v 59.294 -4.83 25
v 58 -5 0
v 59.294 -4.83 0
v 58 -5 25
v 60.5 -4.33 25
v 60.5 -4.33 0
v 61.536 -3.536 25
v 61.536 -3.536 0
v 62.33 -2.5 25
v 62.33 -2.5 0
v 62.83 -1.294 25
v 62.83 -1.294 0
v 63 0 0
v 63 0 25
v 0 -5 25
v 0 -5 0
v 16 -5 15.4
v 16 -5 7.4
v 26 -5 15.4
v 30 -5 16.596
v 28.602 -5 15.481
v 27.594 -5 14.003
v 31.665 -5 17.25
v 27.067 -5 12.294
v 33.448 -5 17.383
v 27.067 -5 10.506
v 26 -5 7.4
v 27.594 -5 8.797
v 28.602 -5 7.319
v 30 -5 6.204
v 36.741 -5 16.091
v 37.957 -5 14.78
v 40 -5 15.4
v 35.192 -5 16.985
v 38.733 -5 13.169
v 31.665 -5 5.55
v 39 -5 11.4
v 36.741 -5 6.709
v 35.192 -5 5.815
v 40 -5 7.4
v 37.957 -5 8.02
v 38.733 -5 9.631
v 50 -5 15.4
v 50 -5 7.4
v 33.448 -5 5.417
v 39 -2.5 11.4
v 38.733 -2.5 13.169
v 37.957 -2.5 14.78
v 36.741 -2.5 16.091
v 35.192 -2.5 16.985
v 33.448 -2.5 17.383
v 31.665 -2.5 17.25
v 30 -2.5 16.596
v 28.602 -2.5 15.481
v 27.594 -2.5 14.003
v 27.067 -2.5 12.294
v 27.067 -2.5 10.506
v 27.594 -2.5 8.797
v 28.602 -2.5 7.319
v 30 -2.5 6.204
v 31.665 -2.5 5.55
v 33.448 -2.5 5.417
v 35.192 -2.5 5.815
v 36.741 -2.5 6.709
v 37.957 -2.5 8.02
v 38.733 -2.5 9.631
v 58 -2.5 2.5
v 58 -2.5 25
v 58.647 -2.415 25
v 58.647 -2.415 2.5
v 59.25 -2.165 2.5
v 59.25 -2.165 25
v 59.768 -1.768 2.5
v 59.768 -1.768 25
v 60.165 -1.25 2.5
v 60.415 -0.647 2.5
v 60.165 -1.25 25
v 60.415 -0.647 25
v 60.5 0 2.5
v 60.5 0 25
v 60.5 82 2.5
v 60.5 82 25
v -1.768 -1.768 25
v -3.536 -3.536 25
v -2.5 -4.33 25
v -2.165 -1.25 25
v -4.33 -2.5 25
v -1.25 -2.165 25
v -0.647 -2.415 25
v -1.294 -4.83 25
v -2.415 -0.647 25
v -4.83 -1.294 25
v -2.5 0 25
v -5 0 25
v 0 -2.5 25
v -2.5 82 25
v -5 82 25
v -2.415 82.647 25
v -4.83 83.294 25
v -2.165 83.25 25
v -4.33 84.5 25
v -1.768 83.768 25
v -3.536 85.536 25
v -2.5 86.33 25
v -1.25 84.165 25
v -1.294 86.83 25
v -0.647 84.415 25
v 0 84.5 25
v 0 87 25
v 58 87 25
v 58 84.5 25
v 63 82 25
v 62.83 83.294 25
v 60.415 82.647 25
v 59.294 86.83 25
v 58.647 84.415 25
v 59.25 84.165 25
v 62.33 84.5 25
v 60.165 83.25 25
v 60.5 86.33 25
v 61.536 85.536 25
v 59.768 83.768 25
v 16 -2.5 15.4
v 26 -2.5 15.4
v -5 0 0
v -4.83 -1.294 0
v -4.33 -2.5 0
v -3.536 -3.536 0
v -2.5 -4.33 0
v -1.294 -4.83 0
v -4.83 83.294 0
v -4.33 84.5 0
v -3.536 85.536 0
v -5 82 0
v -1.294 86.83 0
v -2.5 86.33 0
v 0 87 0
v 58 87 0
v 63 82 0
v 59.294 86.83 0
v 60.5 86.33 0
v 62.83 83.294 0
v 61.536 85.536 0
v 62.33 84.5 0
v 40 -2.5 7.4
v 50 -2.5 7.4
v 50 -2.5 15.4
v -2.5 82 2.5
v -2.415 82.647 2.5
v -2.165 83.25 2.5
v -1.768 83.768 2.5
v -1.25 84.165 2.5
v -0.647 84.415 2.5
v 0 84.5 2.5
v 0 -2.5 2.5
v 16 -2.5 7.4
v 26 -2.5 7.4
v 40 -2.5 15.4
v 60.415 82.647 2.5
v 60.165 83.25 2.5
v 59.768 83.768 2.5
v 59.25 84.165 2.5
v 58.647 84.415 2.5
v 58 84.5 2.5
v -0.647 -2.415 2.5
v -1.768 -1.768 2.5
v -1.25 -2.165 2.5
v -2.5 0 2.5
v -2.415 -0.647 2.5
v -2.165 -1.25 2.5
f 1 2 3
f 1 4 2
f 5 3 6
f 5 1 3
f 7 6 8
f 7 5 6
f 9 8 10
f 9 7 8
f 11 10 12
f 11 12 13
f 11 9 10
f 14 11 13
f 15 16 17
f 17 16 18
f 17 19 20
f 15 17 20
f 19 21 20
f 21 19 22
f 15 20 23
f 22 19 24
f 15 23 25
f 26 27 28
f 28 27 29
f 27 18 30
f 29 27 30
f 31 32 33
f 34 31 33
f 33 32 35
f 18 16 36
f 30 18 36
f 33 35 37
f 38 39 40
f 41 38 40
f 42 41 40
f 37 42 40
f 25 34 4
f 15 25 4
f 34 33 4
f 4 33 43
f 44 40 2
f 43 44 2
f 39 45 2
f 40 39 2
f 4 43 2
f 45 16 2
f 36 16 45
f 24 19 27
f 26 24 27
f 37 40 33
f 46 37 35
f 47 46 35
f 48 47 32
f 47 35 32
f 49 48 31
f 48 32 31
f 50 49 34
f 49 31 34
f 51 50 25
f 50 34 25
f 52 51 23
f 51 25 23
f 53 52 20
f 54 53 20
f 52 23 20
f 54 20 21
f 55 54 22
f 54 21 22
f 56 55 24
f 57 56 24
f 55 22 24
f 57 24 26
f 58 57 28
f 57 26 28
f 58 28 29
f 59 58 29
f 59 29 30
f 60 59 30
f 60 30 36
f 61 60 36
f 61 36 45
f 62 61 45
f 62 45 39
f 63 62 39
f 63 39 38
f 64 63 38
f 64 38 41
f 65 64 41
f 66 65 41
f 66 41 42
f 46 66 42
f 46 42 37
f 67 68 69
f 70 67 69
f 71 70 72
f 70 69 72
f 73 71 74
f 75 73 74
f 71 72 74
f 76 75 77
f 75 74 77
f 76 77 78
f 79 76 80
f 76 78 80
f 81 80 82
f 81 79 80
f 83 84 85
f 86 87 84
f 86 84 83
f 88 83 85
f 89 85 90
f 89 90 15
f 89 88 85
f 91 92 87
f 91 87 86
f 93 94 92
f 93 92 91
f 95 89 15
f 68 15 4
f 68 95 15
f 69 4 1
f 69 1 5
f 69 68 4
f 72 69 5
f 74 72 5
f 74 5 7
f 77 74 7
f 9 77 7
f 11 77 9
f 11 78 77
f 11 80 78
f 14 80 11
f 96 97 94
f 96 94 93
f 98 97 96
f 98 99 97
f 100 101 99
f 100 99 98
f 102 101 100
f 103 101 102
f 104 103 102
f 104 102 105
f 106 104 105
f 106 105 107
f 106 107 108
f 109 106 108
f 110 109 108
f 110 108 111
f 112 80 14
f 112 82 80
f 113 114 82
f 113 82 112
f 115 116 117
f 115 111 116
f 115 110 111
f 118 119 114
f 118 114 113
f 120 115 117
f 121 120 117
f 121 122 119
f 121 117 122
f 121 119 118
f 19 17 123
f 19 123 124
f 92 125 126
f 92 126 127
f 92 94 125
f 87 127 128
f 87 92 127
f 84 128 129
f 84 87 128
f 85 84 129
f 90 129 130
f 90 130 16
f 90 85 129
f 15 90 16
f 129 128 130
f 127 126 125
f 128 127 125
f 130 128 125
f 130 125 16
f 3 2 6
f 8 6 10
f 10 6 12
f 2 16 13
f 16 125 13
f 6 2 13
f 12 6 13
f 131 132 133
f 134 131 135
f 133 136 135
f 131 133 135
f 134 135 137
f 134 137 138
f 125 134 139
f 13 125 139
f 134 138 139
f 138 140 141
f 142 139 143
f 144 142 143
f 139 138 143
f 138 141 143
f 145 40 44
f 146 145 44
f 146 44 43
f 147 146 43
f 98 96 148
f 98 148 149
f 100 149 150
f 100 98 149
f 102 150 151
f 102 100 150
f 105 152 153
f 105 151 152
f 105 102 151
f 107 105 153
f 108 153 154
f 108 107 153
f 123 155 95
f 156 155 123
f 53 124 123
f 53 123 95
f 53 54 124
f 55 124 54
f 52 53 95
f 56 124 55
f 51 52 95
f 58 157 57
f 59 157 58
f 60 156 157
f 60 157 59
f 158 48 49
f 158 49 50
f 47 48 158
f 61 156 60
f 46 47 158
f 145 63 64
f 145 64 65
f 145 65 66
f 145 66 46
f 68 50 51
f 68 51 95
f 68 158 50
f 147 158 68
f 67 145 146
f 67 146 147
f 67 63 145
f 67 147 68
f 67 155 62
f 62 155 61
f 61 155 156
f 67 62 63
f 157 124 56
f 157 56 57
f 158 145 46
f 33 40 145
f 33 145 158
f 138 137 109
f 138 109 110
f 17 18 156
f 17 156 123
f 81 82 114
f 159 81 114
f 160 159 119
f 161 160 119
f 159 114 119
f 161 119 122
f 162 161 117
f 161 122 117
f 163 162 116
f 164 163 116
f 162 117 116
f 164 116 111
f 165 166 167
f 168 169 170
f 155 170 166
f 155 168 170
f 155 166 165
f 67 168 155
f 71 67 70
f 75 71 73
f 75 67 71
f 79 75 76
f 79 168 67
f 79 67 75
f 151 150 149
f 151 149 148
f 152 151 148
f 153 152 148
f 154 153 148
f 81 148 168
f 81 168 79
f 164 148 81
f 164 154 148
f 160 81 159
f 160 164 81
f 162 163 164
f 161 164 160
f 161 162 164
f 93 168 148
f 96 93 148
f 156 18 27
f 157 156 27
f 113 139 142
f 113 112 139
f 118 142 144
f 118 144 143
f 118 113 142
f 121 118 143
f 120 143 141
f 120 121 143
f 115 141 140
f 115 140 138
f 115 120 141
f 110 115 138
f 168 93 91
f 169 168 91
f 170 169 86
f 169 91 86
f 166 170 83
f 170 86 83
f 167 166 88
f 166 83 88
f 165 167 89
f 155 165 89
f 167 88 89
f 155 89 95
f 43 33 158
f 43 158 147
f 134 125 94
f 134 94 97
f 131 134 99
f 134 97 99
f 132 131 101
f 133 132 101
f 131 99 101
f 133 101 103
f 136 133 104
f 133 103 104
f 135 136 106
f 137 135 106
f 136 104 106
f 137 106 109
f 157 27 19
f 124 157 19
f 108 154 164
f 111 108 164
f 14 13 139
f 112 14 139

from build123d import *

# Parameters (mm, degrees)
F0_W     = 58
F0_H     = 82
F1_DEPTH = 19
F2_W     = 67.999994
F2_H     = 91.999994
F3_DEPTH = 25
F4_R     = 5
F5_T     = -2.5
F6_W     = 10
F6_H     = 8
F6_R     = 6
F7_DEPTH = 25


with BuildPart() as f1:
    # F0 (on Top) → F1 (new body)
    with BuildSketch(Plane.XY):
        with Locations((29, 41)):
            Rectangle(F0_W, F0_H)
    extrude(amount=F1_DEPTH)


with BuildPart() as f3:
    # F2 (on Top) → F3 (new body)
    with BuildSketch(Plane.XY):
        with Locations((29, 41)):
            Rectangle(F2_W, F2_H)
    extrude(amount=F3_DEPTH)

    # F4
    f4_edges = [f3.edges().sort_by_distance(p)[0] for p in [
        (-4.999997, -4.999997, 12.5),
        (62.999997, -4.999997, 12.5),
        (-4.999997, 86.999997, 12.5),
        (62.999997, 86.999997, 12.5),
    ]]
    fillet(f4_edges, radius=F4_R)

    # F5
    f5_openings = [f3.faces().sort_by_distance(p)[0] for p in [
        (29, 41, 25),
    ]]
    offset(amount=F5_T, openings=f5_openings)


with BuildPart() as f7_tool:
    # F6 (on face) → F7 (new body)
    with BuildSketch(Plane.XZ.offset(4.999997)):
        with Locations((21.000003, 11.4)):
            Rectangle(F6_W, F6_H)
        with Locations((33.000003, 11.4)):
            Circle(F6_R)
        with Locations((45.000003, 11.4)):
            Rectangle(F6_W, F6_H)
    extrude(amount=-F7_DEPTH)


with BuildPart() as f1_1:
    add(f1.part)

    # F7: cut by f7_tool
    add(f7_tool.part, mode=Mode.SUBTRACT)


with BuildPart() as f3_1:
    add(f3.part)

    # F7: cut by f7_tool
    add(f7_tool.part, mode=Mode.SUBTRACT)


solid = f3_1.part
